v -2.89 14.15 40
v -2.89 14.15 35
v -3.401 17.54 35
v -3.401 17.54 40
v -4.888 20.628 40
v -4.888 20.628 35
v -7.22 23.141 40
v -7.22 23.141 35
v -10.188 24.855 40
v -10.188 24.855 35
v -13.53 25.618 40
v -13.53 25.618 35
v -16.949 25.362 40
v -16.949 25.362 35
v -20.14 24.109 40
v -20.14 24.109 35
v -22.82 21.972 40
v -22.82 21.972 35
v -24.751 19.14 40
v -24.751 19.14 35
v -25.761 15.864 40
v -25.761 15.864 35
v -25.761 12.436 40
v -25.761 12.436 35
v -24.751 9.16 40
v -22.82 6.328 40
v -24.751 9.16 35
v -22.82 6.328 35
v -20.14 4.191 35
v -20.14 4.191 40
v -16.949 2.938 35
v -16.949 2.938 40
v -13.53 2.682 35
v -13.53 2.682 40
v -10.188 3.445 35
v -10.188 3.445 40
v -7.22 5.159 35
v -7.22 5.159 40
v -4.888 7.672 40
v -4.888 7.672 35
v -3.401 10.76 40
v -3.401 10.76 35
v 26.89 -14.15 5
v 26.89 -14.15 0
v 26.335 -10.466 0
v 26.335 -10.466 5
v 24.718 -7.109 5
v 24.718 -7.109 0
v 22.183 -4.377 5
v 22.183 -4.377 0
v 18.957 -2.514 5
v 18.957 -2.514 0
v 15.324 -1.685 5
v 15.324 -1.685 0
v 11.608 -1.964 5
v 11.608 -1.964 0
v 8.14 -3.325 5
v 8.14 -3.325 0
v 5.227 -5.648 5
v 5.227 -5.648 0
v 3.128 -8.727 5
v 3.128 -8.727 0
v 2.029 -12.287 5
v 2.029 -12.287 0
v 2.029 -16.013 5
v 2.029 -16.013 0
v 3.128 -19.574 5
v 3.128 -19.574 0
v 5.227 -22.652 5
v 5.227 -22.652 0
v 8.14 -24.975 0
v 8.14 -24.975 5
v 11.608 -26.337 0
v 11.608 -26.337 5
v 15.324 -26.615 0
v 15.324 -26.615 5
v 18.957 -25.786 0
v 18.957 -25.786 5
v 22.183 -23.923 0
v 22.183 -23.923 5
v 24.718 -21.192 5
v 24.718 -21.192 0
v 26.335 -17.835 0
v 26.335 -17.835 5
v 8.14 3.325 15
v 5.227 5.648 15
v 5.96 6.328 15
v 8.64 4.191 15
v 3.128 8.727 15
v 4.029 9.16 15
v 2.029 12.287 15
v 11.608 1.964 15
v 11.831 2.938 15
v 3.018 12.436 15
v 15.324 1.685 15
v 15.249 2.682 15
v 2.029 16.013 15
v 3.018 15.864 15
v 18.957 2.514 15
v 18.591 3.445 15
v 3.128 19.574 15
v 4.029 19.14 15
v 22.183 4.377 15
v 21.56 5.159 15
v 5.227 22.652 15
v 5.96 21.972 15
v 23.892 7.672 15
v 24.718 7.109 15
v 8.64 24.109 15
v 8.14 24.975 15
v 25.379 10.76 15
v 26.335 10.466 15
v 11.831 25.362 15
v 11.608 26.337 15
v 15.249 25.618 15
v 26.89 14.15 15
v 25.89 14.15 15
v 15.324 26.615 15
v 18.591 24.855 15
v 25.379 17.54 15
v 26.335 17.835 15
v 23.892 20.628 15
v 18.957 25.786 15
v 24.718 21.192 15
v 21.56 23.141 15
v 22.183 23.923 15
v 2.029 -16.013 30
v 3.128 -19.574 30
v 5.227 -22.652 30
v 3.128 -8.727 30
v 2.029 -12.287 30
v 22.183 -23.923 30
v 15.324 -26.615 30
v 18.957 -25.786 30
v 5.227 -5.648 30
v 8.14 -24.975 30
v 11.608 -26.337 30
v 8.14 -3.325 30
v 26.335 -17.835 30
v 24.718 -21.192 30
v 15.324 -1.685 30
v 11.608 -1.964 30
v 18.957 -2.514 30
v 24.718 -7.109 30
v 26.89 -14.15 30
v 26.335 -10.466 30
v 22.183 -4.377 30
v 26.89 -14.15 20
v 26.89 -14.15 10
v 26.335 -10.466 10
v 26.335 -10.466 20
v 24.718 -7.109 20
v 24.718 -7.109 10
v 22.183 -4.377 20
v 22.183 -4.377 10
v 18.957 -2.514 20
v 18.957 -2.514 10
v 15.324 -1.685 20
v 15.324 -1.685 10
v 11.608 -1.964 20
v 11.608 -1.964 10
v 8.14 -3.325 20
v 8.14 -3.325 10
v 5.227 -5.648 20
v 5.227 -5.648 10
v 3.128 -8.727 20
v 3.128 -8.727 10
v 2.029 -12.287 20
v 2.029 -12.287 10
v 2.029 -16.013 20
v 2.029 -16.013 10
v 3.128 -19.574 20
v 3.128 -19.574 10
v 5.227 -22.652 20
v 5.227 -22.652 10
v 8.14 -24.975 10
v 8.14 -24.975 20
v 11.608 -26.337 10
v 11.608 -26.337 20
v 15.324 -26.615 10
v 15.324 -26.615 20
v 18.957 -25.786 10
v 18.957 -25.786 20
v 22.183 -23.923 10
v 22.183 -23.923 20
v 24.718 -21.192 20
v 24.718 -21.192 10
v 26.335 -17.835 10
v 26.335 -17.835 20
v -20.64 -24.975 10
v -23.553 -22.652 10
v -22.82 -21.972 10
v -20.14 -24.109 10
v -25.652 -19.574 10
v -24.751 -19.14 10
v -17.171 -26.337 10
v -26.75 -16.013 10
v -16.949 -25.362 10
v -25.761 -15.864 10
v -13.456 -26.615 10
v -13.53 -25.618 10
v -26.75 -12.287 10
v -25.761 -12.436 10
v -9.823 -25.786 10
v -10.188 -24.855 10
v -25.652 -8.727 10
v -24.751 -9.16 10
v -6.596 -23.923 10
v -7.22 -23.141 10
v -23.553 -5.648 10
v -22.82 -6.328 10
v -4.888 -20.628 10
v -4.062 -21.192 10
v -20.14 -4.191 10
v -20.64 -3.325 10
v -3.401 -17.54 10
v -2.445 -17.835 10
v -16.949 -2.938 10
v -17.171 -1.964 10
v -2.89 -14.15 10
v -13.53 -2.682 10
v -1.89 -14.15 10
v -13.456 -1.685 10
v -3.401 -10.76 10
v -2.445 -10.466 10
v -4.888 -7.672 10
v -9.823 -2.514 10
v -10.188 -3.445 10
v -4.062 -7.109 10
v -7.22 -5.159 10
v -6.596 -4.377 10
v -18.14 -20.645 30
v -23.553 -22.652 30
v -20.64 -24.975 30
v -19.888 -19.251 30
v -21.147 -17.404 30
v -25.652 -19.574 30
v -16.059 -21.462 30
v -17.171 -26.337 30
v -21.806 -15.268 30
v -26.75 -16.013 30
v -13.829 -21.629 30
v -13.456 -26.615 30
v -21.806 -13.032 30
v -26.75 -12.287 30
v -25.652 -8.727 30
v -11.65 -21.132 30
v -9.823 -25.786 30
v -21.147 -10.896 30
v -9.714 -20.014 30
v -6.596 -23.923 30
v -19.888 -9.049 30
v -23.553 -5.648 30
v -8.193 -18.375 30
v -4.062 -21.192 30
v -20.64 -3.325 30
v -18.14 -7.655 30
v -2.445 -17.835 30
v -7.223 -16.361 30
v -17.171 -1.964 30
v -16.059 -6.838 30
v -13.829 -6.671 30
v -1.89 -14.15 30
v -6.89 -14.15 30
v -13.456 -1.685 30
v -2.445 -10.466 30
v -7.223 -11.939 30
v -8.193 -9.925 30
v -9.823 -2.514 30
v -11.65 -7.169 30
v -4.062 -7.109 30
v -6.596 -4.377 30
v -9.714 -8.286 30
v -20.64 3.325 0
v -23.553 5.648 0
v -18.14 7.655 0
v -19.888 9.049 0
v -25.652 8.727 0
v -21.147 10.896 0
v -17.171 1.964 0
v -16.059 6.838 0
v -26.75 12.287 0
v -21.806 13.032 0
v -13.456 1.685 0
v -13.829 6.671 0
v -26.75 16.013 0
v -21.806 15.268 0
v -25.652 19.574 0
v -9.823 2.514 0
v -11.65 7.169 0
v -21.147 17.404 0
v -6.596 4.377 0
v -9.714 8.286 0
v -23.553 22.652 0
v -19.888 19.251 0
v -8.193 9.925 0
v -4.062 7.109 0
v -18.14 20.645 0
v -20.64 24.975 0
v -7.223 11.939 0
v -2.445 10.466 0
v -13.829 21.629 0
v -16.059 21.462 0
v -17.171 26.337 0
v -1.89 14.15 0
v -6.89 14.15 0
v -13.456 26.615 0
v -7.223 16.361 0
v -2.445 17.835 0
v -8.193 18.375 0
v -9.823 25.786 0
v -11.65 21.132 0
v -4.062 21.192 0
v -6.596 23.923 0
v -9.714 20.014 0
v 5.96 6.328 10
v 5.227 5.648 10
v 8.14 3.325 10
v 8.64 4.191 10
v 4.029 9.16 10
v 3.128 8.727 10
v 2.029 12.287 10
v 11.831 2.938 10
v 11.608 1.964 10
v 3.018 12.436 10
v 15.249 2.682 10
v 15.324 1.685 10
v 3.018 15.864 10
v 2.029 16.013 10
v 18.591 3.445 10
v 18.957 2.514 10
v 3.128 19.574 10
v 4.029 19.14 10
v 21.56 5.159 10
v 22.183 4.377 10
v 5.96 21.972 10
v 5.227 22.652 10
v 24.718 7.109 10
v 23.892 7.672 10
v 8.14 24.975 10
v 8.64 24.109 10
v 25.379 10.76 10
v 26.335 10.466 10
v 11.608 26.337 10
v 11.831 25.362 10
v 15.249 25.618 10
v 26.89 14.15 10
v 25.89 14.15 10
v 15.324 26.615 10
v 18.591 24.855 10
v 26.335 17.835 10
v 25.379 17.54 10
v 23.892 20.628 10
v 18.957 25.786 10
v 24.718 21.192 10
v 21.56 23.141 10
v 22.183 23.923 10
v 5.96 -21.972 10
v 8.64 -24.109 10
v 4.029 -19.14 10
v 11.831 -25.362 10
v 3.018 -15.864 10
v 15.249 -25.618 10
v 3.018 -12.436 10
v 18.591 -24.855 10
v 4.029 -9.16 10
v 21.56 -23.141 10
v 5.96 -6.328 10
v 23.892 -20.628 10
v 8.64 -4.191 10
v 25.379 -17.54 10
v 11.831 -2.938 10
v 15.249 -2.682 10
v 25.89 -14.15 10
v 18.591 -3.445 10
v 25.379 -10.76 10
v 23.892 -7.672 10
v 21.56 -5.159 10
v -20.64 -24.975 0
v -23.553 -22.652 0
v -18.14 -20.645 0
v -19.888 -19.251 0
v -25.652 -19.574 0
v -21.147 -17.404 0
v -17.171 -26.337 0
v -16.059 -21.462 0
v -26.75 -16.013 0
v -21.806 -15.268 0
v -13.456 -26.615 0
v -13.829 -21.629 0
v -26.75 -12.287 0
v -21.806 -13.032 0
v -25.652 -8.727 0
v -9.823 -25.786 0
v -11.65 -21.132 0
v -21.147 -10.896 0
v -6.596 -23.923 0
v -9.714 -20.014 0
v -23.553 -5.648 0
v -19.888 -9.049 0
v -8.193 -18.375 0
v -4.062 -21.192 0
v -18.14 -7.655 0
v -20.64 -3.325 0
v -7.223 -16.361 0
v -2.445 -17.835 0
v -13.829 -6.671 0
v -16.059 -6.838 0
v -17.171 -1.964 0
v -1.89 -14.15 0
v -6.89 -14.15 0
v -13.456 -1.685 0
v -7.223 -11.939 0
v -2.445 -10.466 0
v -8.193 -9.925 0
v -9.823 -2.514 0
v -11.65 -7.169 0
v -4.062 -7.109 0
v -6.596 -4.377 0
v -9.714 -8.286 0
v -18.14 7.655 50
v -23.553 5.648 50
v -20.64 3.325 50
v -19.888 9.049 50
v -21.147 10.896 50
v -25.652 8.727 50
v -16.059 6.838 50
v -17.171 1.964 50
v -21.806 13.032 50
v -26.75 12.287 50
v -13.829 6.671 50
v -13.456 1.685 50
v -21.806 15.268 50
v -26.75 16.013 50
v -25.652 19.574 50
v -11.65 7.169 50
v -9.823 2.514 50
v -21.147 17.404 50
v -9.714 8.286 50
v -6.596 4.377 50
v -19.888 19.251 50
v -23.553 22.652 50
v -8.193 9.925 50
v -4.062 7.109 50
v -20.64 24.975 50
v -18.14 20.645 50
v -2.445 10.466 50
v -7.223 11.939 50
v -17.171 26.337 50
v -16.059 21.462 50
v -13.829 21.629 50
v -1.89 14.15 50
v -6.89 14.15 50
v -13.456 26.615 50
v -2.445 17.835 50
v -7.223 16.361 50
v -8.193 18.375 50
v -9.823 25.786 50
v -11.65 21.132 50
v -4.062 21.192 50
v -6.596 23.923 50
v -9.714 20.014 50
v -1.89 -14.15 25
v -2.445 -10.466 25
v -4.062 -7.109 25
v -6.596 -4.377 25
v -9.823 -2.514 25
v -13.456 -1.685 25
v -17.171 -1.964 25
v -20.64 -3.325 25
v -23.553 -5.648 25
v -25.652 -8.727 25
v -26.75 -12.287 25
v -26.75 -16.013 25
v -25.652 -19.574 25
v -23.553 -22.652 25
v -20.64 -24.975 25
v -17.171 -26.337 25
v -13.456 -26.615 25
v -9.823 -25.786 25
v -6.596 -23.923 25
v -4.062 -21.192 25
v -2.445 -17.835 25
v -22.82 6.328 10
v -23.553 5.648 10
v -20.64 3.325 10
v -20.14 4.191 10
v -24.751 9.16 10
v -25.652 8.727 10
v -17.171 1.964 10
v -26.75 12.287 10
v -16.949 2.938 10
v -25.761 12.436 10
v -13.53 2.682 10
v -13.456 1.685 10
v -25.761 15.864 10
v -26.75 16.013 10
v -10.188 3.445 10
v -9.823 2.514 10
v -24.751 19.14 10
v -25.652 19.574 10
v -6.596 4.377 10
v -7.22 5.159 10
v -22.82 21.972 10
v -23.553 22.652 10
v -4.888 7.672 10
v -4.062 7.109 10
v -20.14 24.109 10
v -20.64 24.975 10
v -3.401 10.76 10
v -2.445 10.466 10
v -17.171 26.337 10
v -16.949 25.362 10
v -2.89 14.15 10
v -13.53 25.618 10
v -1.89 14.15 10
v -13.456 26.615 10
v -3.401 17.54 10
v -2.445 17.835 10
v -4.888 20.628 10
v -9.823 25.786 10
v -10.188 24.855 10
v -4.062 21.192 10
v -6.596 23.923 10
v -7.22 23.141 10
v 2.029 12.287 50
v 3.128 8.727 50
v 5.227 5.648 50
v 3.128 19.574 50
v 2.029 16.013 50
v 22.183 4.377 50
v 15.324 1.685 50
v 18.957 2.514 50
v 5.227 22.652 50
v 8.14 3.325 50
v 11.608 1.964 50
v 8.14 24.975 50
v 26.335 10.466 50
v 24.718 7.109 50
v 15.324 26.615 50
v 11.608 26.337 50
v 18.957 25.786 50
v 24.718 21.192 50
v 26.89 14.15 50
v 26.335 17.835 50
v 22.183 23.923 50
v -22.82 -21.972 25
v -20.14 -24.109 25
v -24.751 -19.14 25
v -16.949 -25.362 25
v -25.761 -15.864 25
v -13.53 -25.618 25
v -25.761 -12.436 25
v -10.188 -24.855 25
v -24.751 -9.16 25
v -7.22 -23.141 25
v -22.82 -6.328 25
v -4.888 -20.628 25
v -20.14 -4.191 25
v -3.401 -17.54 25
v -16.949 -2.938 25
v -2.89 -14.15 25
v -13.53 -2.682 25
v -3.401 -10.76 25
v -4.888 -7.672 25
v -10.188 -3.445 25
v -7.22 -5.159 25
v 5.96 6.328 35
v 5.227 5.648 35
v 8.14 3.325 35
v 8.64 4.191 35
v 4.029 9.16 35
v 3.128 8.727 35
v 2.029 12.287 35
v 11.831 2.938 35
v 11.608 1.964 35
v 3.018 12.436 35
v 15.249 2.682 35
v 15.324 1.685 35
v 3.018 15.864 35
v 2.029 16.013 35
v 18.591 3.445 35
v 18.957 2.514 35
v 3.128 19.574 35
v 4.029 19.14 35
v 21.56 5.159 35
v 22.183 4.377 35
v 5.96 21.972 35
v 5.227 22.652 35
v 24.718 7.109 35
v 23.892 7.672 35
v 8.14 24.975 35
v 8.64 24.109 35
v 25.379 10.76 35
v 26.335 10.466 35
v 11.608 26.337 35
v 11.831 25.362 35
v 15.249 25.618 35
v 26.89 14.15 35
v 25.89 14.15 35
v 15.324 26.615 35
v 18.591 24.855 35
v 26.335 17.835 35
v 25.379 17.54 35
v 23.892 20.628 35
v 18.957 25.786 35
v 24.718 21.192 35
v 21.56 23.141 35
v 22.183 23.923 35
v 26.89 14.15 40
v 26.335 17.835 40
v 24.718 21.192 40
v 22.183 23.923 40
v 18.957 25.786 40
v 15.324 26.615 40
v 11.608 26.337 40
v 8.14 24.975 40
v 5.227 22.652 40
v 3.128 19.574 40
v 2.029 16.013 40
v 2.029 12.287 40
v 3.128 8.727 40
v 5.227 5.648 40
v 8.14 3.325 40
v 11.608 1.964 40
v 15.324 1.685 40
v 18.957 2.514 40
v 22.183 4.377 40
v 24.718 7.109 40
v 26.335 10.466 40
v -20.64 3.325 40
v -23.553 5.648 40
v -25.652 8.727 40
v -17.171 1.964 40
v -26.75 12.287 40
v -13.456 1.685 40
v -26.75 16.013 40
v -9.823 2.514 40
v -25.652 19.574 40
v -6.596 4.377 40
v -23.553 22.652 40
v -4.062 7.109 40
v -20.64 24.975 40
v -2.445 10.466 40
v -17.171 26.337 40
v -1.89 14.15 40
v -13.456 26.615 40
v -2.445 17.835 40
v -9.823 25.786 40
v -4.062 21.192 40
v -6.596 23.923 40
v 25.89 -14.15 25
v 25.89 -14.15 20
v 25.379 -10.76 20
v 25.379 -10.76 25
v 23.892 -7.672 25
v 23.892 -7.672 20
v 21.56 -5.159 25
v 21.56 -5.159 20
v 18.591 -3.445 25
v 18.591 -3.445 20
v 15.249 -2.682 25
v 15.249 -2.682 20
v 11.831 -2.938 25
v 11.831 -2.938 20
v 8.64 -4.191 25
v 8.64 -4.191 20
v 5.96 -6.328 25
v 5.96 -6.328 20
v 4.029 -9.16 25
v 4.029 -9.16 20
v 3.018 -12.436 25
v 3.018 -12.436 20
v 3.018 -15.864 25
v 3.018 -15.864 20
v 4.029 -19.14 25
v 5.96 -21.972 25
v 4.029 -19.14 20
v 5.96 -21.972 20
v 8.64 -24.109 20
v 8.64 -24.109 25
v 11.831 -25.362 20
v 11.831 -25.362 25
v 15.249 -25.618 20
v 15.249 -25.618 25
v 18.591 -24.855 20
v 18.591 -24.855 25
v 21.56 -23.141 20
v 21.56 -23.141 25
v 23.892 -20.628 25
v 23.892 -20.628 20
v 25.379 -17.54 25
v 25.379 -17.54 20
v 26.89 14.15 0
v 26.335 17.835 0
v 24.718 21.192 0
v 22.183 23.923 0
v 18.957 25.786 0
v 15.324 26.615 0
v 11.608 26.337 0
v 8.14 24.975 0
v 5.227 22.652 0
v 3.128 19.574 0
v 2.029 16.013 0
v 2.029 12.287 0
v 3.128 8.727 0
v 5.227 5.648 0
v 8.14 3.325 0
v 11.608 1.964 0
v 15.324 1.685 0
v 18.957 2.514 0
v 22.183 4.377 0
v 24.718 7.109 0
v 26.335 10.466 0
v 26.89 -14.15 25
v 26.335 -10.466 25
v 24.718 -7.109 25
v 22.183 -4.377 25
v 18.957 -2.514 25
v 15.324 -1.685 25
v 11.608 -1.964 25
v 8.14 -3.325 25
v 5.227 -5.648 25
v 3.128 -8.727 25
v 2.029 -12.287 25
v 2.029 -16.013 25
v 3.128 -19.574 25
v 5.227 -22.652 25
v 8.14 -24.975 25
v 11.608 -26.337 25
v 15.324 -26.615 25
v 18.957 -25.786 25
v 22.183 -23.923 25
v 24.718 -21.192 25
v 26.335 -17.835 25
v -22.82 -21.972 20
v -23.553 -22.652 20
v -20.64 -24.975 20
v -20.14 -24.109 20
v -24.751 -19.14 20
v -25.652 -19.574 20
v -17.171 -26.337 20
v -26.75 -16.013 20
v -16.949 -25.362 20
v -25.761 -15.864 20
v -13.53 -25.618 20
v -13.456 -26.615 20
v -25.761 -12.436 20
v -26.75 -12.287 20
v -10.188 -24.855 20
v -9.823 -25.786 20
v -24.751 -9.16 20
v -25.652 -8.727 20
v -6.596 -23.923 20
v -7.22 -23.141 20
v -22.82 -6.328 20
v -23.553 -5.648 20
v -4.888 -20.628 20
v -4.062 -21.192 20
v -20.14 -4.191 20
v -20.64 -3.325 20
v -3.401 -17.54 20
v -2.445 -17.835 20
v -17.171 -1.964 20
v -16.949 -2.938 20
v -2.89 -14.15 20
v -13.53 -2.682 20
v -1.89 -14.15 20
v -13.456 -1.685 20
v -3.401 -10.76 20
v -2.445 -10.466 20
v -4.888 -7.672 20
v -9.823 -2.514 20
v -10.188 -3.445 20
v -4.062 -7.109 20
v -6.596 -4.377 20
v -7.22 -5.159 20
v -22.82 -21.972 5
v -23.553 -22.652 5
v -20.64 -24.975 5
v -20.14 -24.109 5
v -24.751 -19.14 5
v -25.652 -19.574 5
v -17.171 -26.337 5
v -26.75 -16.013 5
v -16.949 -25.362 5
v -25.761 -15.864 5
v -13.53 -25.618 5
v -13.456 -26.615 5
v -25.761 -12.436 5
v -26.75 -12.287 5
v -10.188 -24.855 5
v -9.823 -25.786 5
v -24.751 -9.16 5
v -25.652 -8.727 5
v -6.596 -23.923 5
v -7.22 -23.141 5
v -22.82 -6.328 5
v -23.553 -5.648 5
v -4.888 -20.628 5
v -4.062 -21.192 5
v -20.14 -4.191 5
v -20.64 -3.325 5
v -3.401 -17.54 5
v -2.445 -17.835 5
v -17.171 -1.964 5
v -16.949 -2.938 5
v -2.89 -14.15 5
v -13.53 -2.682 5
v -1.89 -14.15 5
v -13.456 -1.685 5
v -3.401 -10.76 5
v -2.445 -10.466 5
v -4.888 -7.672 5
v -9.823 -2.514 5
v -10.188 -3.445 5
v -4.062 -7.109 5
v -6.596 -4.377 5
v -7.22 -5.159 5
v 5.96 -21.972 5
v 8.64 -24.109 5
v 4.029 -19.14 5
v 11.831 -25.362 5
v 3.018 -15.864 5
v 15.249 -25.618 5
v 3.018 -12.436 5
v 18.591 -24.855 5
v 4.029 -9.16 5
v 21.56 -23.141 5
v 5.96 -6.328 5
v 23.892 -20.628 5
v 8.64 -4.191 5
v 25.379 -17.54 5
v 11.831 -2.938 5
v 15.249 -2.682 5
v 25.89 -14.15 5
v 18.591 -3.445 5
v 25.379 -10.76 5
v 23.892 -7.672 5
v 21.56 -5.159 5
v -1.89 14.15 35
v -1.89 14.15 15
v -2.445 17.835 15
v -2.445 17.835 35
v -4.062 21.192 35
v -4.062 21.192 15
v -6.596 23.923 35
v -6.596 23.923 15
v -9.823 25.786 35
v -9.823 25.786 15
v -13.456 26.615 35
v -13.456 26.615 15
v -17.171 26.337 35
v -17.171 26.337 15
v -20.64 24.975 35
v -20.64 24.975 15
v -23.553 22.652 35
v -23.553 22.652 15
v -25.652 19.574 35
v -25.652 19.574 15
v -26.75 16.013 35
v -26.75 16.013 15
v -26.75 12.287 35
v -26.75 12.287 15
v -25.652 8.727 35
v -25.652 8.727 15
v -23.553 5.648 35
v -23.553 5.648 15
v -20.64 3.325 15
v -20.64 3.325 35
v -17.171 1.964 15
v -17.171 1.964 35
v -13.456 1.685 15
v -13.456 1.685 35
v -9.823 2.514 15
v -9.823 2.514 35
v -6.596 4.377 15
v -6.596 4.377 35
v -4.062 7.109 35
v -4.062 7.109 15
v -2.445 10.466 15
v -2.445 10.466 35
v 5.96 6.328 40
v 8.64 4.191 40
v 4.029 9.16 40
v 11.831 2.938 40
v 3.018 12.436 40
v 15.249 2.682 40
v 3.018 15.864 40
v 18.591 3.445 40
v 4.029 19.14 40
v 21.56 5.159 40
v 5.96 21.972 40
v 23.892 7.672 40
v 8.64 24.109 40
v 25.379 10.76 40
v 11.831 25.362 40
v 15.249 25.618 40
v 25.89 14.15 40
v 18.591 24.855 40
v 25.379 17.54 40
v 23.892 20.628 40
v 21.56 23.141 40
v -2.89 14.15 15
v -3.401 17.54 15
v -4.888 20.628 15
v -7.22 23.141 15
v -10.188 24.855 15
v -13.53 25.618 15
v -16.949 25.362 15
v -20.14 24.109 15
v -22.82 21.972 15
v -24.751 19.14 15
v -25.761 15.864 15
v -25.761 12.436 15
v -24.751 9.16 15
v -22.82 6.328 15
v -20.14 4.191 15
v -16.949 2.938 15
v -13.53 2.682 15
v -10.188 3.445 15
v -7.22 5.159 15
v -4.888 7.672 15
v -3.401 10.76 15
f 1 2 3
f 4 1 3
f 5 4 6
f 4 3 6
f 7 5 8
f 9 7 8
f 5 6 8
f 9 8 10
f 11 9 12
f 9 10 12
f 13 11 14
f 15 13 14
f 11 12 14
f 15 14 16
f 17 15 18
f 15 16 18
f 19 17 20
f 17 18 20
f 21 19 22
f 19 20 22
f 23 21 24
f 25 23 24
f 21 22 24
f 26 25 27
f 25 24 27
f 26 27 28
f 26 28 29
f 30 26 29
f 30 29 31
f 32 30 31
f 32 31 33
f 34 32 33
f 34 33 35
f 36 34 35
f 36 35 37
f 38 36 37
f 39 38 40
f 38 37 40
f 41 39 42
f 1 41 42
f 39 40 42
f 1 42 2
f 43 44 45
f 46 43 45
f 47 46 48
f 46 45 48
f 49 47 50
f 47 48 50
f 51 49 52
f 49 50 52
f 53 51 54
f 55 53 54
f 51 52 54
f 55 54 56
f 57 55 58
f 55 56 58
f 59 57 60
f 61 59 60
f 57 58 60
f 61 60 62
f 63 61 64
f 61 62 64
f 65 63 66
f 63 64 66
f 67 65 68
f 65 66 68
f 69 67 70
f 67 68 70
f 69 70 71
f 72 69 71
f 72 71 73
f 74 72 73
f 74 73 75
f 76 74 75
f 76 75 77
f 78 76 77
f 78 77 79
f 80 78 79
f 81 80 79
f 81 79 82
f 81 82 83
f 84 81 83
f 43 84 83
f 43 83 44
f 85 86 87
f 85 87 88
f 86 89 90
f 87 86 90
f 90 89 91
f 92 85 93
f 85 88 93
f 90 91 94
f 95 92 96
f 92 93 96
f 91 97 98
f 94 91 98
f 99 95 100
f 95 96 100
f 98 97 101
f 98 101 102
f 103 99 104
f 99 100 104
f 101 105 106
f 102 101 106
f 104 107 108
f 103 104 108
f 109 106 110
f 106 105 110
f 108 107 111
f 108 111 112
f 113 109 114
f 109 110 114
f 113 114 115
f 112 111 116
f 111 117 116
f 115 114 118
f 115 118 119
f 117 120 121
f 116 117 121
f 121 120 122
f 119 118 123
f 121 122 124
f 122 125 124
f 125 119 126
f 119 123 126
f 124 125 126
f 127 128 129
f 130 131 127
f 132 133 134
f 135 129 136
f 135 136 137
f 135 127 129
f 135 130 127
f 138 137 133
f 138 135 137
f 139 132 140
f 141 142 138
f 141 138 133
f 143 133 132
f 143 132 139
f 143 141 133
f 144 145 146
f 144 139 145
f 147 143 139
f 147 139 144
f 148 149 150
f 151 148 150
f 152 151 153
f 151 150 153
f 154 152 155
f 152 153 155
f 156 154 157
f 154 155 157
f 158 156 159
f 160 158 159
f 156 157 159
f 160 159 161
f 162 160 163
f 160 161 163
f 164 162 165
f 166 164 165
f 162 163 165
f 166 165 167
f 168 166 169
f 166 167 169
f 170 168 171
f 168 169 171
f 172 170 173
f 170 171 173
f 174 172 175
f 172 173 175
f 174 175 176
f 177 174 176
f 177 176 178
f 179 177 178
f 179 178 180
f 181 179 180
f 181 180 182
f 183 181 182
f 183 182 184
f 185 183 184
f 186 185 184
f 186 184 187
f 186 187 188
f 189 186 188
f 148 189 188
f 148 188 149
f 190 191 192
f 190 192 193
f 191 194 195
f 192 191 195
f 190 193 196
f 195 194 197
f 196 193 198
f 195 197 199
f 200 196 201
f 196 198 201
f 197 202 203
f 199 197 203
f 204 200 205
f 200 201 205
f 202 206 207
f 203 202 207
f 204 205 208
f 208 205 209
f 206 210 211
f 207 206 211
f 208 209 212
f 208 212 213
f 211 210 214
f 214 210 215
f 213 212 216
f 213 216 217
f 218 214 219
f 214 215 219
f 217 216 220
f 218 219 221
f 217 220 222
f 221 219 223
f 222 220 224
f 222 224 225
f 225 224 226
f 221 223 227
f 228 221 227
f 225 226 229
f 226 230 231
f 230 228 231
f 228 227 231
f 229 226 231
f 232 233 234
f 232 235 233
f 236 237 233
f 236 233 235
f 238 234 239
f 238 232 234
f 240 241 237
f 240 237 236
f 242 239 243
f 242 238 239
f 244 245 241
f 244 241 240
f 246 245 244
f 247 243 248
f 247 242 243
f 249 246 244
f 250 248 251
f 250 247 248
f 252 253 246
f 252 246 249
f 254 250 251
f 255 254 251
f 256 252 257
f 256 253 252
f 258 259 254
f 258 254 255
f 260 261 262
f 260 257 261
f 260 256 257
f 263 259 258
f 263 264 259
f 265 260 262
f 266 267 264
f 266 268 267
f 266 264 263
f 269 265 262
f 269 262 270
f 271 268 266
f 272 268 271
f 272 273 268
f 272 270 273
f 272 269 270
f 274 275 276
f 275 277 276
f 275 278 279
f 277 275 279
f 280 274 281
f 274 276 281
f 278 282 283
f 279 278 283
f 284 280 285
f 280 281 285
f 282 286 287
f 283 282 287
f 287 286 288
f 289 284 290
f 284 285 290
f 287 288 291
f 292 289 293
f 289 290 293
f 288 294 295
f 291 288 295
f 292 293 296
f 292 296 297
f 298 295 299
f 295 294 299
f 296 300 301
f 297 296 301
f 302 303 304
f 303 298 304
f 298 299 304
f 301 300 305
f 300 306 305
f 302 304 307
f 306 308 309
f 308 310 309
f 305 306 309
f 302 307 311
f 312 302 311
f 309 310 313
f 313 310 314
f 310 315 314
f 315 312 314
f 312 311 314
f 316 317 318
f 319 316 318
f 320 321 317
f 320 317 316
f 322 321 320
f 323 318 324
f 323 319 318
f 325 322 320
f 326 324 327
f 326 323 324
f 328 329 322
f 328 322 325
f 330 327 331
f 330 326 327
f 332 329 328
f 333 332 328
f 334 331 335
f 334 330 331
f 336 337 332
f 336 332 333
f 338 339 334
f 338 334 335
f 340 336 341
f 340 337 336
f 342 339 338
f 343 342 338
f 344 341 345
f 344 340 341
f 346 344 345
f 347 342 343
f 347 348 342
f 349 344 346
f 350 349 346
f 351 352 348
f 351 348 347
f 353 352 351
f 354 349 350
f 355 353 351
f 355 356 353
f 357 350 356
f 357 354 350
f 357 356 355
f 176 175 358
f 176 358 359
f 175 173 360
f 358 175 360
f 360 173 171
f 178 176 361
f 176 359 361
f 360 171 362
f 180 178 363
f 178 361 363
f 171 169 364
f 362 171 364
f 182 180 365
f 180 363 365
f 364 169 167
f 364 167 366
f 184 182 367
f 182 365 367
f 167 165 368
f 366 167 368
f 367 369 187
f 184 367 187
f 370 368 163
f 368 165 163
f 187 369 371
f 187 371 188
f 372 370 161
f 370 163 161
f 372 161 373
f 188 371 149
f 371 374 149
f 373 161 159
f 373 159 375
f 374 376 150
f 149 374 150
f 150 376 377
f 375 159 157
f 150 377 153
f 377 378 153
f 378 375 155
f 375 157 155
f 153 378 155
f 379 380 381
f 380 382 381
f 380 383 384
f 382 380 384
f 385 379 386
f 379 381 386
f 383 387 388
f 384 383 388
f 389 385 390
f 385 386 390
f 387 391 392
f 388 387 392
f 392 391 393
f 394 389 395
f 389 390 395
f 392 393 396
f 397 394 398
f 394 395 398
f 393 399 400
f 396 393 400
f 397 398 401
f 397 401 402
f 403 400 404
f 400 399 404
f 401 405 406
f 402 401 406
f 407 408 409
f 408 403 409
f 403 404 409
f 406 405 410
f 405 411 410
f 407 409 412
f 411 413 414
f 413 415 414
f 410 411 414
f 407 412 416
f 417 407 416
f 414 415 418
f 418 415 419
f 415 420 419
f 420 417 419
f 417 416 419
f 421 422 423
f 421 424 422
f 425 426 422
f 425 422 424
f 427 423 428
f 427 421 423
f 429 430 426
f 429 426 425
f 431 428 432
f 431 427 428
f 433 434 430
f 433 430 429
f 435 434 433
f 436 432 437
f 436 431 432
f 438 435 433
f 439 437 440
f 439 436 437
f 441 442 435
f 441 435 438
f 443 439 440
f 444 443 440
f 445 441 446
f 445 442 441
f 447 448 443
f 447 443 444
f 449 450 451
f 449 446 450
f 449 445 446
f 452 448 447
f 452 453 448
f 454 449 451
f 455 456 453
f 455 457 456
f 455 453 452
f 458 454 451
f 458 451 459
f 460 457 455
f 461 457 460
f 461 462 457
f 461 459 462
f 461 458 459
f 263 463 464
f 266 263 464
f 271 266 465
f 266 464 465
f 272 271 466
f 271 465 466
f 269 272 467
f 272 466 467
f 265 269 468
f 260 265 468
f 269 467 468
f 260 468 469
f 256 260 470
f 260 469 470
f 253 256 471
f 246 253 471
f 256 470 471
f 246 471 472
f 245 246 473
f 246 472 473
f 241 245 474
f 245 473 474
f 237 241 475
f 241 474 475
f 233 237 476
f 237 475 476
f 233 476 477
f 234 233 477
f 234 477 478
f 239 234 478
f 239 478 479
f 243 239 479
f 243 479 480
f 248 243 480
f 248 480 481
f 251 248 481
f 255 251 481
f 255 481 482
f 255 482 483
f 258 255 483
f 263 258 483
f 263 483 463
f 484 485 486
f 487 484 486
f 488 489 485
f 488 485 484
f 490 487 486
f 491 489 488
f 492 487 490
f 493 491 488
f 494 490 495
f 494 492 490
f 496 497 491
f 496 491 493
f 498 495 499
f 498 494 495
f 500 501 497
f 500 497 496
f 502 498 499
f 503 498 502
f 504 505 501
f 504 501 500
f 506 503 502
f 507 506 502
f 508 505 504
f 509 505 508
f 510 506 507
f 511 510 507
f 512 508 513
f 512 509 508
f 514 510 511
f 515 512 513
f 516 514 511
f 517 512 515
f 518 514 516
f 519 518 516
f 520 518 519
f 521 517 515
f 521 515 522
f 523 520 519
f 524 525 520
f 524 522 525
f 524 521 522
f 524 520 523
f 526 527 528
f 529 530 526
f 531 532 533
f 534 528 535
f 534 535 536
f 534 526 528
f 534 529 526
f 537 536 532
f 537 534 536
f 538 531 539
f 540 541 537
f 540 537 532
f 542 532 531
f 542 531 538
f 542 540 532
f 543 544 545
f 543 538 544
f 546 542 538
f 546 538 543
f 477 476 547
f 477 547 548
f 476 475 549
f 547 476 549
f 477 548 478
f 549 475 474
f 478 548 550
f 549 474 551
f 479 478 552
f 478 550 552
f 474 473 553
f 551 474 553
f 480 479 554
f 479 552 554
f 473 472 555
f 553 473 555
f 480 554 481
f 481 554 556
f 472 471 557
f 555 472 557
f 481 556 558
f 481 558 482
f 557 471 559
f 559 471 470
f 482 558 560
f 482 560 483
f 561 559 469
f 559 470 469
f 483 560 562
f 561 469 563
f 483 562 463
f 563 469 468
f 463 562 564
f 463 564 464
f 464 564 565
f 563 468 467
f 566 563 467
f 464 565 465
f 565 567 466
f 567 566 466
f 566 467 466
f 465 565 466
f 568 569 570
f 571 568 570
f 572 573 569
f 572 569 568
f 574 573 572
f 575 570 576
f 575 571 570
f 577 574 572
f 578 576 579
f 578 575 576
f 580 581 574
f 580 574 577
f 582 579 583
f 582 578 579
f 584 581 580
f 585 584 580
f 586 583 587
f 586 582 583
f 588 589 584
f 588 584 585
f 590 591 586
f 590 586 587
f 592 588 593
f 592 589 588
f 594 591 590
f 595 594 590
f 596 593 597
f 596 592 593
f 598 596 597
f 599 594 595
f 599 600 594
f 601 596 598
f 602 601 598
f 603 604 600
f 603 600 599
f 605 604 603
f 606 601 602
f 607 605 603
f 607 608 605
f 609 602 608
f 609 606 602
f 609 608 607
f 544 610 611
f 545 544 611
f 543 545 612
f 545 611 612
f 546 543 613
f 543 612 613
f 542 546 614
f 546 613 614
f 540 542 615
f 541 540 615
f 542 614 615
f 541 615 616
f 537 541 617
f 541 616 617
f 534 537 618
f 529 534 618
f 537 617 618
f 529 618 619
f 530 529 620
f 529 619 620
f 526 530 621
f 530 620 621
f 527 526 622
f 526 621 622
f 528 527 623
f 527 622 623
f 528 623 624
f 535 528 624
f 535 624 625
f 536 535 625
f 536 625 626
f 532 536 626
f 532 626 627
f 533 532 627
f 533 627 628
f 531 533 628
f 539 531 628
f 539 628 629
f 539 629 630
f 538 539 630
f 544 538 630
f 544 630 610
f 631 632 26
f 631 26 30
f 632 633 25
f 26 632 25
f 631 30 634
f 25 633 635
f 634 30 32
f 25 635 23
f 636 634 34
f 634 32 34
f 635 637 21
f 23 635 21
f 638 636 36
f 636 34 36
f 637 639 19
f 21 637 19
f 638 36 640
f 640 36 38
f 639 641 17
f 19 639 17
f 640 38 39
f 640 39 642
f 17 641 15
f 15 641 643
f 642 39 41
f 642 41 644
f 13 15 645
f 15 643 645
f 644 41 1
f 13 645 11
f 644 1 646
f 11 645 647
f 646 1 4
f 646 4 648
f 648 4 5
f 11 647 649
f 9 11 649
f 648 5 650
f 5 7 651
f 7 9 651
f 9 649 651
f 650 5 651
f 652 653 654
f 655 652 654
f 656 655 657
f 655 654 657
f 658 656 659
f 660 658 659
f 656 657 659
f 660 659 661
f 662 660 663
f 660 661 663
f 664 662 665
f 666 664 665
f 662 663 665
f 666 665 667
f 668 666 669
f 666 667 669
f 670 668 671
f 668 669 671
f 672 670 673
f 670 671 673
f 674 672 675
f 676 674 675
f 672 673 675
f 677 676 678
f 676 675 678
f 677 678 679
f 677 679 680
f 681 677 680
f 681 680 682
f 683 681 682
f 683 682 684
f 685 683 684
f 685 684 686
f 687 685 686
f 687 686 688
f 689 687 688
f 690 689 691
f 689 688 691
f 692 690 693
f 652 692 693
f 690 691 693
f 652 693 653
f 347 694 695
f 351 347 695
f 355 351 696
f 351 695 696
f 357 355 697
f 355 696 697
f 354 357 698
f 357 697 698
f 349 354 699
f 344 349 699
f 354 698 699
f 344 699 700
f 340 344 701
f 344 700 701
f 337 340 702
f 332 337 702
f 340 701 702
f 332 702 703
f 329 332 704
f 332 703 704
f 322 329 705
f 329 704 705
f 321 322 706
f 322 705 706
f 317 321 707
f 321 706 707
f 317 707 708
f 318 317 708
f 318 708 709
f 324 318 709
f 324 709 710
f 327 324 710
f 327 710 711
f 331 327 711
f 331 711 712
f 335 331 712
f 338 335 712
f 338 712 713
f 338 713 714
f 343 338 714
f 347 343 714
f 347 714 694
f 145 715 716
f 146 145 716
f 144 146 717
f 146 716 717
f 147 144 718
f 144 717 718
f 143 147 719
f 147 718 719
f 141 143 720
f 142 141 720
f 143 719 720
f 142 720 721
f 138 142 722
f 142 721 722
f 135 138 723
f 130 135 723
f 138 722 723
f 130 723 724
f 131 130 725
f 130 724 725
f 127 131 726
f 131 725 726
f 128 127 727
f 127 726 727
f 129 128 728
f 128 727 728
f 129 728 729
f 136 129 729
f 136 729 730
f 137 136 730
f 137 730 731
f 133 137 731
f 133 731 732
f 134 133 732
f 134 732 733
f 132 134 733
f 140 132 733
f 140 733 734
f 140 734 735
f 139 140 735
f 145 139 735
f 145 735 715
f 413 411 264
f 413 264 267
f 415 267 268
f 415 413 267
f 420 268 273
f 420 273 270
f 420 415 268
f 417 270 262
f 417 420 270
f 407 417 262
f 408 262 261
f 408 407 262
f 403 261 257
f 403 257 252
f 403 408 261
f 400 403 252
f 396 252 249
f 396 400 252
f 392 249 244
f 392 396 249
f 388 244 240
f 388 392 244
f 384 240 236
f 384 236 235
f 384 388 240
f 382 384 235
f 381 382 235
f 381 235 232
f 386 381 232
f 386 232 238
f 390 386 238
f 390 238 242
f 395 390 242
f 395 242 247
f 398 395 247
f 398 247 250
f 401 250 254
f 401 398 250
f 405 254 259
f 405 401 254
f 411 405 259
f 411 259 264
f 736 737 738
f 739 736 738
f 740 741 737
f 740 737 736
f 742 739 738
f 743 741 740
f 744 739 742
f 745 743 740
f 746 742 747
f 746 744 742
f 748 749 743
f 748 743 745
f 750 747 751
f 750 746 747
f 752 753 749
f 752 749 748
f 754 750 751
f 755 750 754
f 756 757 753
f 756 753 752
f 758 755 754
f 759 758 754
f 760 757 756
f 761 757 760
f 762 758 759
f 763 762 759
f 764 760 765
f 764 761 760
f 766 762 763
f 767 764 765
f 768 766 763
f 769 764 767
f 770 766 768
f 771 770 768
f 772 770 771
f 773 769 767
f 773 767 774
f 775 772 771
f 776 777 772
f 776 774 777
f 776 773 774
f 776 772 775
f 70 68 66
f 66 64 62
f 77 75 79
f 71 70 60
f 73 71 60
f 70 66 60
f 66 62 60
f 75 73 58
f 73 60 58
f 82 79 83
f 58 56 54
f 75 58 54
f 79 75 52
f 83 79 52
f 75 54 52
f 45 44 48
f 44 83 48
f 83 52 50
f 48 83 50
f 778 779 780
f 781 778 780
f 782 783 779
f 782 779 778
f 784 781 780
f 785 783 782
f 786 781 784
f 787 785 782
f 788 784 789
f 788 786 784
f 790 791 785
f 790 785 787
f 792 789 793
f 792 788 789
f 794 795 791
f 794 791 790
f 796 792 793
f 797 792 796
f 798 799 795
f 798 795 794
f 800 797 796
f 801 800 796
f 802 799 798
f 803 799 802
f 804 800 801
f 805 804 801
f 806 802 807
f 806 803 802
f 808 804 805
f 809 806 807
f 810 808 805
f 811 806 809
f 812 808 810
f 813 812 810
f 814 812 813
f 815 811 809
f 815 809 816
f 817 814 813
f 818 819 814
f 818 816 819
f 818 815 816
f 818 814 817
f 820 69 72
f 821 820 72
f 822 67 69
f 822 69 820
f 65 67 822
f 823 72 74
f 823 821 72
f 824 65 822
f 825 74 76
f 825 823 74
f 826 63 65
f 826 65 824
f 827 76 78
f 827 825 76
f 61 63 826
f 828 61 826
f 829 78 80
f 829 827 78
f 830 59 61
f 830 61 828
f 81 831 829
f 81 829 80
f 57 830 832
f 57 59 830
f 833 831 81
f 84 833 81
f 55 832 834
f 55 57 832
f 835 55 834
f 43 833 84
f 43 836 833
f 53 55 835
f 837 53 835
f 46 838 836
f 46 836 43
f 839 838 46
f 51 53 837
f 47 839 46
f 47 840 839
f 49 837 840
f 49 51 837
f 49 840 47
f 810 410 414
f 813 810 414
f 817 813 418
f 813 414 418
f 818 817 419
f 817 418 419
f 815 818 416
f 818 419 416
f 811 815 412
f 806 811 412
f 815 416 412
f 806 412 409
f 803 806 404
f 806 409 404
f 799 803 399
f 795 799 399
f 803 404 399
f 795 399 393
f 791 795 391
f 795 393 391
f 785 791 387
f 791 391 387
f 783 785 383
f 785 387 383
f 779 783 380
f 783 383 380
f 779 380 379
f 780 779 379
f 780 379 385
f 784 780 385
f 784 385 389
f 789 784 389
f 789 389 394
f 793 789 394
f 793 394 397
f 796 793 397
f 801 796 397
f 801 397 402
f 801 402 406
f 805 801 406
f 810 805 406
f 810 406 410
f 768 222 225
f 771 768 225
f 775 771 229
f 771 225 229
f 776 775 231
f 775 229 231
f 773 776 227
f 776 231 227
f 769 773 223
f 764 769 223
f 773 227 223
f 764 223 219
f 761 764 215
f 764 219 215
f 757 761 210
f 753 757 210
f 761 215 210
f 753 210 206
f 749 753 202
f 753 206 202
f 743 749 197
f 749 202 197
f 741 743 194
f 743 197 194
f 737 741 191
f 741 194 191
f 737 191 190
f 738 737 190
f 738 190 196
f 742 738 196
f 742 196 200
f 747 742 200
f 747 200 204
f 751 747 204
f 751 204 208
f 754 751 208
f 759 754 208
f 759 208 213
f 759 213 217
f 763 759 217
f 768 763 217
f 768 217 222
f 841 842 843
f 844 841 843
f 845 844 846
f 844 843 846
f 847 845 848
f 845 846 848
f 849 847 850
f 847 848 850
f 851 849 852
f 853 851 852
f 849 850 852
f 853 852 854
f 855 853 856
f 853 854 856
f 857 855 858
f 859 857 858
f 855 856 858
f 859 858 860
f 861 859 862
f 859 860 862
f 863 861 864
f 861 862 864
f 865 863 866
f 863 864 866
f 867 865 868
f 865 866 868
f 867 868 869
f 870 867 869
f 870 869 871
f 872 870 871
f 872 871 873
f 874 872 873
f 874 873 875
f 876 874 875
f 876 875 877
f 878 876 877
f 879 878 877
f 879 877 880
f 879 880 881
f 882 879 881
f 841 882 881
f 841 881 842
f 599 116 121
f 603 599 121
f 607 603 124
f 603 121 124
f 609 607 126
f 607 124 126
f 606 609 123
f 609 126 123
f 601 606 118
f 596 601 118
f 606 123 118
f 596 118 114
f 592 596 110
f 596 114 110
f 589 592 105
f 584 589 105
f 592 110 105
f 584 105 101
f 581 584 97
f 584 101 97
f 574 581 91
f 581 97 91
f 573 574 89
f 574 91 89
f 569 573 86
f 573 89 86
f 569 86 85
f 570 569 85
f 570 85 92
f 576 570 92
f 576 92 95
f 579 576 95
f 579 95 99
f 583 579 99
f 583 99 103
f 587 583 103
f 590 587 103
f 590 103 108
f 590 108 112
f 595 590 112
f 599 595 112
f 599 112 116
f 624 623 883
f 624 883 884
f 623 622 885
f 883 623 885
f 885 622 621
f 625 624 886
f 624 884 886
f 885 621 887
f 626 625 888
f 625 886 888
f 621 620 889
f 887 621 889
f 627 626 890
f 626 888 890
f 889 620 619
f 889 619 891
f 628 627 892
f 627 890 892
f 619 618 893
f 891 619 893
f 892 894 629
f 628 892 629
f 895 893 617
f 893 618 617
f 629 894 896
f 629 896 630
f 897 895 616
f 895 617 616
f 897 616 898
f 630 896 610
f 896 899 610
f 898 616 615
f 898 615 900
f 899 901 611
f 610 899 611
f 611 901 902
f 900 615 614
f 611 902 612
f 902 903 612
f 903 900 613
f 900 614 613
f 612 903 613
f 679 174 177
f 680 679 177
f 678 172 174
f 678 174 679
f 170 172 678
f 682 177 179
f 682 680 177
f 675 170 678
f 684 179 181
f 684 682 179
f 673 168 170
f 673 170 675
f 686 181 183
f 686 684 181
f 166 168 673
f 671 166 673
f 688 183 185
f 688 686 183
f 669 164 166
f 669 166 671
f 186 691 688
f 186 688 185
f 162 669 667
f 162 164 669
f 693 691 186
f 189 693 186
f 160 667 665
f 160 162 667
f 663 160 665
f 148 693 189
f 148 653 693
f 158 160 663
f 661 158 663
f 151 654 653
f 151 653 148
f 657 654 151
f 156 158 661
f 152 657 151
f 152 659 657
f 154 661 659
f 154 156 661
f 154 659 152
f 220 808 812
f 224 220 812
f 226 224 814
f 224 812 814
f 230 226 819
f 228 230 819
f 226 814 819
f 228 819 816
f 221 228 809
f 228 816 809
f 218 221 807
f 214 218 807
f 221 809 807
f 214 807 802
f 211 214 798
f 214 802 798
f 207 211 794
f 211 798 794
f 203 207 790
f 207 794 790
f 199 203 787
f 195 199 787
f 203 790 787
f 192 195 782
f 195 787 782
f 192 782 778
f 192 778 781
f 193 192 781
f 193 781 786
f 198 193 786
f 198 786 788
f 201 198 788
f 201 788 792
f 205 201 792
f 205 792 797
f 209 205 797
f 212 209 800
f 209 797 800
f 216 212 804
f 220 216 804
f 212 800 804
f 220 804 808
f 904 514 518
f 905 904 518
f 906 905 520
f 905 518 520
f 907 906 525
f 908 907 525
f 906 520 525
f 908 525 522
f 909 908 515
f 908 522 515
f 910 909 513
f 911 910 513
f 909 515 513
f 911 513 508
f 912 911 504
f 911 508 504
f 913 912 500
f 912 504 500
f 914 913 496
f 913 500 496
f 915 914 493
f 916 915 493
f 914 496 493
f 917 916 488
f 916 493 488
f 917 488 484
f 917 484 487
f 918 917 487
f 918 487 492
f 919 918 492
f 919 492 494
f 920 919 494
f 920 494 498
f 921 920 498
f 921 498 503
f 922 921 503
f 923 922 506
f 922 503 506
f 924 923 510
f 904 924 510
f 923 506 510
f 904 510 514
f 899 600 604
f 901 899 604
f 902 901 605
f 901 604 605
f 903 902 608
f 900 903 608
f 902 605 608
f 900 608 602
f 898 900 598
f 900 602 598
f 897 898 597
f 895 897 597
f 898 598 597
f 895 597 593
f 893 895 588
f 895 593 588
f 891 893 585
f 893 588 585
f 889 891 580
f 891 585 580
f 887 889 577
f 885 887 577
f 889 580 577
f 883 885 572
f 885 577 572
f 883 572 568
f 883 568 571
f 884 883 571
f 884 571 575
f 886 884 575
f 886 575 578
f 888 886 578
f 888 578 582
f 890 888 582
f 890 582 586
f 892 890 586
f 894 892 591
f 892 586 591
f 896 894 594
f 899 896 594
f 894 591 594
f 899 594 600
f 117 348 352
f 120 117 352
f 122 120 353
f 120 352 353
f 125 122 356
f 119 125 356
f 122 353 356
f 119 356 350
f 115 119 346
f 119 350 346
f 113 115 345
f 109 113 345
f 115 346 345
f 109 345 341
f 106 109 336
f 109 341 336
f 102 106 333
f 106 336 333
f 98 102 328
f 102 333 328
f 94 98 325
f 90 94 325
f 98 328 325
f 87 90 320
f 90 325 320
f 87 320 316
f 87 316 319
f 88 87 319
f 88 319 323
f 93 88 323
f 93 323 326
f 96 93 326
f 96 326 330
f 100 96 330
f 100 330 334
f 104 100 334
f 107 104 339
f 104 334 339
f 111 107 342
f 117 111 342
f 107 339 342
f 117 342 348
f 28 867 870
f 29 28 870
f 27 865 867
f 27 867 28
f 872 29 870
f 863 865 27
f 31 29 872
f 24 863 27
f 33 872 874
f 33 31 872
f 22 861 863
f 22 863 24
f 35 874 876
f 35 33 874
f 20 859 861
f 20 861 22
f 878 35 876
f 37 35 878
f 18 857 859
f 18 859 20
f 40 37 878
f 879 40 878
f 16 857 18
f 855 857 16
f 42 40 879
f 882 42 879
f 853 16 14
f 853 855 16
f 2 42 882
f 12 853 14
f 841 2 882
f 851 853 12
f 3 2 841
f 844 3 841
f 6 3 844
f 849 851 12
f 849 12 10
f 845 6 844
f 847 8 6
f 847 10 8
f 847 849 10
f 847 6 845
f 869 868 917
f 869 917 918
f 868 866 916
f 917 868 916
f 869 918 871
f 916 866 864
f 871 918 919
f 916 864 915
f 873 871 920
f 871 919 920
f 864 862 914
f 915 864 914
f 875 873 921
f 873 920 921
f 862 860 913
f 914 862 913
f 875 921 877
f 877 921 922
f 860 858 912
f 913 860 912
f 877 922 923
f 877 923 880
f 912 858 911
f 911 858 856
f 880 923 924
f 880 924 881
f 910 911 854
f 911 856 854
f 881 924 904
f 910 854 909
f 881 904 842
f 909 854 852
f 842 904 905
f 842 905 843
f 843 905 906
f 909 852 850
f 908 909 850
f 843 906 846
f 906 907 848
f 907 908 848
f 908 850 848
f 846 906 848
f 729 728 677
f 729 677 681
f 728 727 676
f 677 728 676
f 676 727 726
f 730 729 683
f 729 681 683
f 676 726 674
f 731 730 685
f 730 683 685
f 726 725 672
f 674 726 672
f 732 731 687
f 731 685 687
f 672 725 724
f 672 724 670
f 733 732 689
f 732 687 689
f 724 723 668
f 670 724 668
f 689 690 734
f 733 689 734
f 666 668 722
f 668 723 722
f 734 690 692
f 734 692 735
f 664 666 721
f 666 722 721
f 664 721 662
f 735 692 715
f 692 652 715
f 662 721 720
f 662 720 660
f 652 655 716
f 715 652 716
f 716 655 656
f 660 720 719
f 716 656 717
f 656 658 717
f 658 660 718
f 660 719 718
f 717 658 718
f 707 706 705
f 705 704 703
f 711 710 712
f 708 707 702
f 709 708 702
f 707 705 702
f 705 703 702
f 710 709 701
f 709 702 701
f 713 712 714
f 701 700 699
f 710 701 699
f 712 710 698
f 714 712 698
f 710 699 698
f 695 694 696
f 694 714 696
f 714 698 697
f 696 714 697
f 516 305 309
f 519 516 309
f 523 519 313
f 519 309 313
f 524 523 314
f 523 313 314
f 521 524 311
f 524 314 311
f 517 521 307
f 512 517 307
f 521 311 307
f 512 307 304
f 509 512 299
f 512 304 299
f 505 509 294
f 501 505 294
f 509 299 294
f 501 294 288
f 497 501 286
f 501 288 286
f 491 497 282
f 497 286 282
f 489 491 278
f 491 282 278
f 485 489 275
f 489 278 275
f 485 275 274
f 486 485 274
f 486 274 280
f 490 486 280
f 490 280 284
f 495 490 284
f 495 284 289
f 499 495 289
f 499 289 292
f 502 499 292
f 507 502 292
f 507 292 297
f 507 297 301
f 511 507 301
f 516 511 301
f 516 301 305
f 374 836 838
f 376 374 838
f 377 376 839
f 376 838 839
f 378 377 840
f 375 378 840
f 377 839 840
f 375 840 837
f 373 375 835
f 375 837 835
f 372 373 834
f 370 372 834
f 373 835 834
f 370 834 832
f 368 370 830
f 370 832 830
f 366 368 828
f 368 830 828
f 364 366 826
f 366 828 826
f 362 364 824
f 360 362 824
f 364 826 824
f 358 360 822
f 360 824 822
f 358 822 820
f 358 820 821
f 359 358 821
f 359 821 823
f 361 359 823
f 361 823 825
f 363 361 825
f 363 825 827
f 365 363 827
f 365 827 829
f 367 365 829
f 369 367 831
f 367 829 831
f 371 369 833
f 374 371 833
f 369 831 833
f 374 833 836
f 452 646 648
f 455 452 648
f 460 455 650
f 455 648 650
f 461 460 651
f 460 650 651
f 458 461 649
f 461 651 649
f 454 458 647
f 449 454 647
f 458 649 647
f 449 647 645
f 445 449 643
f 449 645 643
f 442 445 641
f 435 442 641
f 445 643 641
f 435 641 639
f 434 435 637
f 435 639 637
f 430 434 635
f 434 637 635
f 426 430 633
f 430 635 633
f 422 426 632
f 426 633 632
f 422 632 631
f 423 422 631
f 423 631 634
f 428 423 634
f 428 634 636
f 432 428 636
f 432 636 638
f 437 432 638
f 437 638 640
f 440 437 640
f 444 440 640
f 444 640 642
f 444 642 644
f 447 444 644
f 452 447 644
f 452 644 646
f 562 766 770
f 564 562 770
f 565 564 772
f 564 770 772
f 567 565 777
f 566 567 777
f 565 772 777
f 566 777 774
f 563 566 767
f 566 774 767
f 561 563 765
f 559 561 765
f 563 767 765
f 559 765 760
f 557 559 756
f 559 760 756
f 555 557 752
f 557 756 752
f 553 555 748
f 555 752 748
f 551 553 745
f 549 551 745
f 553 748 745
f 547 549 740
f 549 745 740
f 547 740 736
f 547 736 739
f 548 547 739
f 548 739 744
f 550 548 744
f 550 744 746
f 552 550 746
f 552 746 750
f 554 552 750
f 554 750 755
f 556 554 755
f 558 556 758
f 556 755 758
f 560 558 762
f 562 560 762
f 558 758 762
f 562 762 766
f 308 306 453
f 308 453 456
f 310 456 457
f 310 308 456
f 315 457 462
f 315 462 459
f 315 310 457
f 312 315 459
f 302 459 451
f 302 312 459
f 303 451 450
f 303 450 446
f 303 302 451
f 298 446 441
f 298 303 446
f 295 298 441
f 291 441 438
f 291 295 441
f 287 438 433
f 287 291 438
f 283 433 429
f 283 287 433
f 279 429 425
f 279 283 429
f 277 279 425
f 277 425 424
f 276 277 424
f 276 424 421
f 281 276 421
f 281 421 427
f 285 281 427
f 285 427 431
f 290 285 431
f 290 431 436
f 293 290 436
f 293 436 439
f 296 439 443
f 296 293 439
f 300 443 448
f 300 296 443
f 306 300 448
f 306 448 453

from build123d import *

# Parameters (mm, degrees)
F0_R     = 12.5
F0_R_2   = 11.5
F0_R_3   = 7.5
F1_DEPTH = 50
F2_DEPTH = 30
F3_START = 10
F3_DEPTH = 5
F4_START = 35
F4_DEPTH = 5
F5_START = 5
F5_DEPTH = 5
F6_START = 20
F6_DEPTH = 5


with BuildPart() as f1:
    # F0 (on Top) → F1 (new body)
    with BuildSketch(Plane.XY):
        with Locations((14.3898613751, 14.1501259059)):
            Circle(F0_R)
        with Locations((14.3898613751, 14.1501259059)):
            Circle(F0_R_2, mode=Mode.SUBTRACT)
        with Locations((14.3898613751, 14.1501259059)):
            Circle(F0_R_2)
        with Locations((14.3898613751, 14.1501259059)):
            Circle(F0_R_3, mode=Mode.SUBTRACT)
        with Locations((14.3898613751, 14.1501259059)):
            Circle(F0_R_3)
    extrude(amount=F1_DEPTH)


with BuildPart() as f1b:
    # F0 (on Top) → F1, piece 2 (new body)
    with BuildSketch(Plane.XY):
        with Locations((-14.3898613751, 14.1501259059)):
            Circle(F0_R)
        with Locations((-14.3898613751, 14.1501259059)):
            Circle(F0_R_2, mode=Mode.SUBTRACT)
        with Locations((-14.3898613751, 14.1501259059)):
            Circle(F0_R_2)
        with Locations((-14.3898613751, 14.1501259059)):
            Circle(F0_R_3, mode=Mode.SUBTRACT)
    extrude(amount=F1_DEPTH)


with BuildPart() as f2:
    # F0 (on Top) → F2 (new body)
    with BuildSketch(Plane.XY):
        with Locations((14.3898613751, -14.1501259059)):
            Circle(F0_R)
        with Locations((14.3898613751, -14.1501259059)):
            Circle(F0_R_2, mode=Mode.SUBTRACT)
        with Locations((14.3898613751, -14.1501259059)):
            Circle(F0_R_2)
        with Locations((14.3898613751, -14.1501259059)):
            Circle(F0_R_3, mode=Mode.SUBTRACT)
        with Locations((14.3898613751, -14.1501259059)):
            Circle(F0_R_3)
    extrude(amount=F2_DEPTH)


with BuildPart() as f2b:
    # F0 (on Top) → F2, piece 2 (new body)
    with BuildSketch(Plane.XY):
        with Locations((-14.3898613751, -14.1501259059)):
            Circle(F0_R)
        with Locations((-14.3898613751, -14.1501259059)):
            Circle(F0_R_2, mode=Mode.SUBTRACT)
        with Locations((-14.3898613751, -14.1501259059)):
            Circle(F0_R_2)
        with Locations((-14.3898613751, -14.1501259059)):
            Circle(F0_R_3, mode=Mode.SUBTRACT)
    extrude(amount=F2_DEPTH)


with BuildPart() as f3_tool:
    # F0 (on Top) → F3 (new body)
    with BuildSketch(Plane.XY.offset(F3_START)):
        with Locations((-14.3898613751, 14.1501259059)):
            Circle(F0_R)
        with Locations((-14.3898613751, 14.1501259059)):
            Circle(F0_R_2, mode=Mode.SUBTRACT)
        with Locations((14.3898613751, 14.1501259059)):
            Circle(F0_R)
        with Locations((14.3898613751, 14.1501259059)):
            Circle(F0_R_2, mode=Mode.SUBTRACT)
    extrude(amount=F3_DEPTH)


with BuildPart() as f1_1:
    add(f1.part)

    # F3: cut by f3_tool
    add(f3_tool.part, mode=Mode.SUBTRACT)


with BuildPart() as f1b_1:
    add(f1b.part)

    # F3: cut by f3_tool
    add(f3_tool.part, mode=Mode.SUBTRACT)


with BuildPart() as f4_tool:
    # F0 (on Top) → F4 (new body)
    with BuildSketch(Plane.XY.offset(F4_START)):
        with Locations((-14.3898613751, 14.1501259059)):
            Circle(F0_R)
        with Locations((-14.3898613751, 14.1501259059)):
            Circle(F0_R_2, mode=Mode.SUBTRACT)
        with Locations((14.3898613751, 14.1501259059)):
            Circle(F0_R)
        with Locations((14.3898613751, 14.1501259059)):
            Circle(F0_R_2, mode=Mode.SUBTRACT)
    extrude(amount=F4_DEPTH)


with BuildPart() as f1_2:
    add(f1_1.part)

    # F4: cut by f4_tool
    add(f4_tool.part, mode=Mode.SUBTRACT)


with BuildPart() as f1b_2:
    add(f1b_1.part)

    # F4: cut by f4_tool
    add(f4_tool.part, mode=Mode.SUBTRACT)


with BuildPart() as f5_tool:
    # F0 (on Top) → F5 (new body)
    with BuildSketch(Plane.XY.offset(F5_START)):
        with Locations((-14.3898613751, -14.1501259059)):
            Circle(F0_R)
        with Locations((-14.3898613751, -14.1501259059)):
            Circle(F0_R_2, mode=Mode.SUBTRACT)
        with Locations((14.3898613751, -14.1501259059)):
            Circle(F0_R)
        with Locations((14.3898613751, -14.1501259059)):
            Circle(F0_R_2, mode=Mode.SUBTRACT)
    extrude(amount=F5_DEPTH)


with BuildPart() as f2_1:
    add(f2.part)

    # F5: cut by f5_tool
    add(f5_tool.part, mode=Mode.SUBTRACT)


with BuildPart() as f2b_1:
    add(f2b.part)

    # F5: cut by f5_tool
    add(f5_tool.part, mode=Mode.SUBTRACT)


with BuildPart() as f6_tool:
    # F0 (on Top) → F6 (new body)
    with BuildSketch(Plane.XY.offset(F6_START)):
        with Locations((-14.3898613751, -14.1501259059)):
            Circle(F0_R)
        with Locations((-14.3898613751, -14.1501259059)):
            Circle(F0_R_2, mode=Mode.SUBTRACT)
        with Locations((14.3898613751, -14.1501259059)):
            Circle(F0_R)
        with Locations((14.3898613751, -14.1501259059)):
            Circle(F0_R_2, mode=Mode.SUBTRACT)
    extrude(amount=F6_DEPTH)


with BuildPart() as f2_2:
    add(f2_1.part)

    # F6: cut by f6_tool
    add(f6_tool.part, mode=Mode.SUBTRACT)


with BuildPart() as f2b_2:
    add(f2b_1.part)

    # F6: cut by f6_tool
    add(f6_tool.part, mode=Mode.SUBTRACT)


solid = Compound([f1_2.part, f1b_2.part, f2_2.part, f2b_2.part])
